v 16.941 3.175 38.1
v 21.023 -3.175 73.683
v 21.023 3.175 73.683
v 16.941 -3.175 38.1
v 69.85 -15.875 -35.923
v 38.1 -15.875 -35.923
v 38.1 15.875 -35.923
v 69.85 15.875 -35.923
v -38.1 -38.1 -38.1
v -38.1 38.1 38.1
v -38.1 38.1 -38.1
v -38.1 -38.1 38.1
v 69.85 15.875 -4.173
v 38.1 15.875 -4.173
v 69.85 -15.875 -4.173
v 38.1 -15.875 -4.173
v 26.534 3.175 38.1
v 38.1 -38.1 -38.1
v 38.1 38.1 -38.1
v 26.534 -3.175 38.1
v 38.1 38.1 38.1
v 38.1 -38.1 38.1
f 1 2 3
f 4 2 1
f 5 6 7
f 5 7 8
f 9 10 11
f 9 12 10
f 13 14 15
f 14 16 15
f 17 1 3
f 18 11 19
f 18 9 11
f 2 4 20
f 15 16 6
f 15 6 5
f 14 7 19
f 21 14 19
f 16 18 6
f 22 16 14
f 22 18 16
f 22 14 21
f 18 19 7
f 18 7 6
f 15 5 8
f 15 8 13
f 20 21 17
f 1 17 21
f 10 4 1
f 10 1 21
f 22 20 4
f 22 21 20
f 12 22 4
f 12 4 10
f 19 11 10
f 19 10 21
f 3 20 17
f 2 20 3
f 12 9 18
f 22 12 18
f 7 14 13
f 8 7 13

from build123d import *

# Parameters (mm, degrees)
F1_DEPTH = 38.1
F0_W     = 31.75
F0_H     = 31.75
F2_DEPTH = 15.875
F3_DEPTH = 3.175


with BuildPart() as f1:
    # F0 (on Front) → F1 (new body, symmetric)
    with BuildSketch(Plane.XZ):
        Polygon((-38.1, -38.1), (38.1, -38.1), (38.1, -35.922859), (38.1, -4.172859), (38.1, 38.1), (26.53393, 38.1), (16.940894, 38.1), (-38.1, 38.1), align=None)
    extrude(amount=F1_DEPTH, both=True)

    # F0 (on Front) → F2 (join, symmetric)
    with BuildSketch(Plane.XZ):
        with Locations((53.975, -20.047859)):
            Rectangle(F0_W, F0_H)
    extrude(amount=F2_DEPTH, both=True)

    # F0 (on Front) → F3 (join, symmetric)
    with BuildSketch(Plane.XZ):
        Polygon((21.023035, 73.682681), (16.940894, 38.1), (26.53393, 38.1), align=None)
    extrude(amount=F3_DEPTH, both=True)


solid = f1.part
